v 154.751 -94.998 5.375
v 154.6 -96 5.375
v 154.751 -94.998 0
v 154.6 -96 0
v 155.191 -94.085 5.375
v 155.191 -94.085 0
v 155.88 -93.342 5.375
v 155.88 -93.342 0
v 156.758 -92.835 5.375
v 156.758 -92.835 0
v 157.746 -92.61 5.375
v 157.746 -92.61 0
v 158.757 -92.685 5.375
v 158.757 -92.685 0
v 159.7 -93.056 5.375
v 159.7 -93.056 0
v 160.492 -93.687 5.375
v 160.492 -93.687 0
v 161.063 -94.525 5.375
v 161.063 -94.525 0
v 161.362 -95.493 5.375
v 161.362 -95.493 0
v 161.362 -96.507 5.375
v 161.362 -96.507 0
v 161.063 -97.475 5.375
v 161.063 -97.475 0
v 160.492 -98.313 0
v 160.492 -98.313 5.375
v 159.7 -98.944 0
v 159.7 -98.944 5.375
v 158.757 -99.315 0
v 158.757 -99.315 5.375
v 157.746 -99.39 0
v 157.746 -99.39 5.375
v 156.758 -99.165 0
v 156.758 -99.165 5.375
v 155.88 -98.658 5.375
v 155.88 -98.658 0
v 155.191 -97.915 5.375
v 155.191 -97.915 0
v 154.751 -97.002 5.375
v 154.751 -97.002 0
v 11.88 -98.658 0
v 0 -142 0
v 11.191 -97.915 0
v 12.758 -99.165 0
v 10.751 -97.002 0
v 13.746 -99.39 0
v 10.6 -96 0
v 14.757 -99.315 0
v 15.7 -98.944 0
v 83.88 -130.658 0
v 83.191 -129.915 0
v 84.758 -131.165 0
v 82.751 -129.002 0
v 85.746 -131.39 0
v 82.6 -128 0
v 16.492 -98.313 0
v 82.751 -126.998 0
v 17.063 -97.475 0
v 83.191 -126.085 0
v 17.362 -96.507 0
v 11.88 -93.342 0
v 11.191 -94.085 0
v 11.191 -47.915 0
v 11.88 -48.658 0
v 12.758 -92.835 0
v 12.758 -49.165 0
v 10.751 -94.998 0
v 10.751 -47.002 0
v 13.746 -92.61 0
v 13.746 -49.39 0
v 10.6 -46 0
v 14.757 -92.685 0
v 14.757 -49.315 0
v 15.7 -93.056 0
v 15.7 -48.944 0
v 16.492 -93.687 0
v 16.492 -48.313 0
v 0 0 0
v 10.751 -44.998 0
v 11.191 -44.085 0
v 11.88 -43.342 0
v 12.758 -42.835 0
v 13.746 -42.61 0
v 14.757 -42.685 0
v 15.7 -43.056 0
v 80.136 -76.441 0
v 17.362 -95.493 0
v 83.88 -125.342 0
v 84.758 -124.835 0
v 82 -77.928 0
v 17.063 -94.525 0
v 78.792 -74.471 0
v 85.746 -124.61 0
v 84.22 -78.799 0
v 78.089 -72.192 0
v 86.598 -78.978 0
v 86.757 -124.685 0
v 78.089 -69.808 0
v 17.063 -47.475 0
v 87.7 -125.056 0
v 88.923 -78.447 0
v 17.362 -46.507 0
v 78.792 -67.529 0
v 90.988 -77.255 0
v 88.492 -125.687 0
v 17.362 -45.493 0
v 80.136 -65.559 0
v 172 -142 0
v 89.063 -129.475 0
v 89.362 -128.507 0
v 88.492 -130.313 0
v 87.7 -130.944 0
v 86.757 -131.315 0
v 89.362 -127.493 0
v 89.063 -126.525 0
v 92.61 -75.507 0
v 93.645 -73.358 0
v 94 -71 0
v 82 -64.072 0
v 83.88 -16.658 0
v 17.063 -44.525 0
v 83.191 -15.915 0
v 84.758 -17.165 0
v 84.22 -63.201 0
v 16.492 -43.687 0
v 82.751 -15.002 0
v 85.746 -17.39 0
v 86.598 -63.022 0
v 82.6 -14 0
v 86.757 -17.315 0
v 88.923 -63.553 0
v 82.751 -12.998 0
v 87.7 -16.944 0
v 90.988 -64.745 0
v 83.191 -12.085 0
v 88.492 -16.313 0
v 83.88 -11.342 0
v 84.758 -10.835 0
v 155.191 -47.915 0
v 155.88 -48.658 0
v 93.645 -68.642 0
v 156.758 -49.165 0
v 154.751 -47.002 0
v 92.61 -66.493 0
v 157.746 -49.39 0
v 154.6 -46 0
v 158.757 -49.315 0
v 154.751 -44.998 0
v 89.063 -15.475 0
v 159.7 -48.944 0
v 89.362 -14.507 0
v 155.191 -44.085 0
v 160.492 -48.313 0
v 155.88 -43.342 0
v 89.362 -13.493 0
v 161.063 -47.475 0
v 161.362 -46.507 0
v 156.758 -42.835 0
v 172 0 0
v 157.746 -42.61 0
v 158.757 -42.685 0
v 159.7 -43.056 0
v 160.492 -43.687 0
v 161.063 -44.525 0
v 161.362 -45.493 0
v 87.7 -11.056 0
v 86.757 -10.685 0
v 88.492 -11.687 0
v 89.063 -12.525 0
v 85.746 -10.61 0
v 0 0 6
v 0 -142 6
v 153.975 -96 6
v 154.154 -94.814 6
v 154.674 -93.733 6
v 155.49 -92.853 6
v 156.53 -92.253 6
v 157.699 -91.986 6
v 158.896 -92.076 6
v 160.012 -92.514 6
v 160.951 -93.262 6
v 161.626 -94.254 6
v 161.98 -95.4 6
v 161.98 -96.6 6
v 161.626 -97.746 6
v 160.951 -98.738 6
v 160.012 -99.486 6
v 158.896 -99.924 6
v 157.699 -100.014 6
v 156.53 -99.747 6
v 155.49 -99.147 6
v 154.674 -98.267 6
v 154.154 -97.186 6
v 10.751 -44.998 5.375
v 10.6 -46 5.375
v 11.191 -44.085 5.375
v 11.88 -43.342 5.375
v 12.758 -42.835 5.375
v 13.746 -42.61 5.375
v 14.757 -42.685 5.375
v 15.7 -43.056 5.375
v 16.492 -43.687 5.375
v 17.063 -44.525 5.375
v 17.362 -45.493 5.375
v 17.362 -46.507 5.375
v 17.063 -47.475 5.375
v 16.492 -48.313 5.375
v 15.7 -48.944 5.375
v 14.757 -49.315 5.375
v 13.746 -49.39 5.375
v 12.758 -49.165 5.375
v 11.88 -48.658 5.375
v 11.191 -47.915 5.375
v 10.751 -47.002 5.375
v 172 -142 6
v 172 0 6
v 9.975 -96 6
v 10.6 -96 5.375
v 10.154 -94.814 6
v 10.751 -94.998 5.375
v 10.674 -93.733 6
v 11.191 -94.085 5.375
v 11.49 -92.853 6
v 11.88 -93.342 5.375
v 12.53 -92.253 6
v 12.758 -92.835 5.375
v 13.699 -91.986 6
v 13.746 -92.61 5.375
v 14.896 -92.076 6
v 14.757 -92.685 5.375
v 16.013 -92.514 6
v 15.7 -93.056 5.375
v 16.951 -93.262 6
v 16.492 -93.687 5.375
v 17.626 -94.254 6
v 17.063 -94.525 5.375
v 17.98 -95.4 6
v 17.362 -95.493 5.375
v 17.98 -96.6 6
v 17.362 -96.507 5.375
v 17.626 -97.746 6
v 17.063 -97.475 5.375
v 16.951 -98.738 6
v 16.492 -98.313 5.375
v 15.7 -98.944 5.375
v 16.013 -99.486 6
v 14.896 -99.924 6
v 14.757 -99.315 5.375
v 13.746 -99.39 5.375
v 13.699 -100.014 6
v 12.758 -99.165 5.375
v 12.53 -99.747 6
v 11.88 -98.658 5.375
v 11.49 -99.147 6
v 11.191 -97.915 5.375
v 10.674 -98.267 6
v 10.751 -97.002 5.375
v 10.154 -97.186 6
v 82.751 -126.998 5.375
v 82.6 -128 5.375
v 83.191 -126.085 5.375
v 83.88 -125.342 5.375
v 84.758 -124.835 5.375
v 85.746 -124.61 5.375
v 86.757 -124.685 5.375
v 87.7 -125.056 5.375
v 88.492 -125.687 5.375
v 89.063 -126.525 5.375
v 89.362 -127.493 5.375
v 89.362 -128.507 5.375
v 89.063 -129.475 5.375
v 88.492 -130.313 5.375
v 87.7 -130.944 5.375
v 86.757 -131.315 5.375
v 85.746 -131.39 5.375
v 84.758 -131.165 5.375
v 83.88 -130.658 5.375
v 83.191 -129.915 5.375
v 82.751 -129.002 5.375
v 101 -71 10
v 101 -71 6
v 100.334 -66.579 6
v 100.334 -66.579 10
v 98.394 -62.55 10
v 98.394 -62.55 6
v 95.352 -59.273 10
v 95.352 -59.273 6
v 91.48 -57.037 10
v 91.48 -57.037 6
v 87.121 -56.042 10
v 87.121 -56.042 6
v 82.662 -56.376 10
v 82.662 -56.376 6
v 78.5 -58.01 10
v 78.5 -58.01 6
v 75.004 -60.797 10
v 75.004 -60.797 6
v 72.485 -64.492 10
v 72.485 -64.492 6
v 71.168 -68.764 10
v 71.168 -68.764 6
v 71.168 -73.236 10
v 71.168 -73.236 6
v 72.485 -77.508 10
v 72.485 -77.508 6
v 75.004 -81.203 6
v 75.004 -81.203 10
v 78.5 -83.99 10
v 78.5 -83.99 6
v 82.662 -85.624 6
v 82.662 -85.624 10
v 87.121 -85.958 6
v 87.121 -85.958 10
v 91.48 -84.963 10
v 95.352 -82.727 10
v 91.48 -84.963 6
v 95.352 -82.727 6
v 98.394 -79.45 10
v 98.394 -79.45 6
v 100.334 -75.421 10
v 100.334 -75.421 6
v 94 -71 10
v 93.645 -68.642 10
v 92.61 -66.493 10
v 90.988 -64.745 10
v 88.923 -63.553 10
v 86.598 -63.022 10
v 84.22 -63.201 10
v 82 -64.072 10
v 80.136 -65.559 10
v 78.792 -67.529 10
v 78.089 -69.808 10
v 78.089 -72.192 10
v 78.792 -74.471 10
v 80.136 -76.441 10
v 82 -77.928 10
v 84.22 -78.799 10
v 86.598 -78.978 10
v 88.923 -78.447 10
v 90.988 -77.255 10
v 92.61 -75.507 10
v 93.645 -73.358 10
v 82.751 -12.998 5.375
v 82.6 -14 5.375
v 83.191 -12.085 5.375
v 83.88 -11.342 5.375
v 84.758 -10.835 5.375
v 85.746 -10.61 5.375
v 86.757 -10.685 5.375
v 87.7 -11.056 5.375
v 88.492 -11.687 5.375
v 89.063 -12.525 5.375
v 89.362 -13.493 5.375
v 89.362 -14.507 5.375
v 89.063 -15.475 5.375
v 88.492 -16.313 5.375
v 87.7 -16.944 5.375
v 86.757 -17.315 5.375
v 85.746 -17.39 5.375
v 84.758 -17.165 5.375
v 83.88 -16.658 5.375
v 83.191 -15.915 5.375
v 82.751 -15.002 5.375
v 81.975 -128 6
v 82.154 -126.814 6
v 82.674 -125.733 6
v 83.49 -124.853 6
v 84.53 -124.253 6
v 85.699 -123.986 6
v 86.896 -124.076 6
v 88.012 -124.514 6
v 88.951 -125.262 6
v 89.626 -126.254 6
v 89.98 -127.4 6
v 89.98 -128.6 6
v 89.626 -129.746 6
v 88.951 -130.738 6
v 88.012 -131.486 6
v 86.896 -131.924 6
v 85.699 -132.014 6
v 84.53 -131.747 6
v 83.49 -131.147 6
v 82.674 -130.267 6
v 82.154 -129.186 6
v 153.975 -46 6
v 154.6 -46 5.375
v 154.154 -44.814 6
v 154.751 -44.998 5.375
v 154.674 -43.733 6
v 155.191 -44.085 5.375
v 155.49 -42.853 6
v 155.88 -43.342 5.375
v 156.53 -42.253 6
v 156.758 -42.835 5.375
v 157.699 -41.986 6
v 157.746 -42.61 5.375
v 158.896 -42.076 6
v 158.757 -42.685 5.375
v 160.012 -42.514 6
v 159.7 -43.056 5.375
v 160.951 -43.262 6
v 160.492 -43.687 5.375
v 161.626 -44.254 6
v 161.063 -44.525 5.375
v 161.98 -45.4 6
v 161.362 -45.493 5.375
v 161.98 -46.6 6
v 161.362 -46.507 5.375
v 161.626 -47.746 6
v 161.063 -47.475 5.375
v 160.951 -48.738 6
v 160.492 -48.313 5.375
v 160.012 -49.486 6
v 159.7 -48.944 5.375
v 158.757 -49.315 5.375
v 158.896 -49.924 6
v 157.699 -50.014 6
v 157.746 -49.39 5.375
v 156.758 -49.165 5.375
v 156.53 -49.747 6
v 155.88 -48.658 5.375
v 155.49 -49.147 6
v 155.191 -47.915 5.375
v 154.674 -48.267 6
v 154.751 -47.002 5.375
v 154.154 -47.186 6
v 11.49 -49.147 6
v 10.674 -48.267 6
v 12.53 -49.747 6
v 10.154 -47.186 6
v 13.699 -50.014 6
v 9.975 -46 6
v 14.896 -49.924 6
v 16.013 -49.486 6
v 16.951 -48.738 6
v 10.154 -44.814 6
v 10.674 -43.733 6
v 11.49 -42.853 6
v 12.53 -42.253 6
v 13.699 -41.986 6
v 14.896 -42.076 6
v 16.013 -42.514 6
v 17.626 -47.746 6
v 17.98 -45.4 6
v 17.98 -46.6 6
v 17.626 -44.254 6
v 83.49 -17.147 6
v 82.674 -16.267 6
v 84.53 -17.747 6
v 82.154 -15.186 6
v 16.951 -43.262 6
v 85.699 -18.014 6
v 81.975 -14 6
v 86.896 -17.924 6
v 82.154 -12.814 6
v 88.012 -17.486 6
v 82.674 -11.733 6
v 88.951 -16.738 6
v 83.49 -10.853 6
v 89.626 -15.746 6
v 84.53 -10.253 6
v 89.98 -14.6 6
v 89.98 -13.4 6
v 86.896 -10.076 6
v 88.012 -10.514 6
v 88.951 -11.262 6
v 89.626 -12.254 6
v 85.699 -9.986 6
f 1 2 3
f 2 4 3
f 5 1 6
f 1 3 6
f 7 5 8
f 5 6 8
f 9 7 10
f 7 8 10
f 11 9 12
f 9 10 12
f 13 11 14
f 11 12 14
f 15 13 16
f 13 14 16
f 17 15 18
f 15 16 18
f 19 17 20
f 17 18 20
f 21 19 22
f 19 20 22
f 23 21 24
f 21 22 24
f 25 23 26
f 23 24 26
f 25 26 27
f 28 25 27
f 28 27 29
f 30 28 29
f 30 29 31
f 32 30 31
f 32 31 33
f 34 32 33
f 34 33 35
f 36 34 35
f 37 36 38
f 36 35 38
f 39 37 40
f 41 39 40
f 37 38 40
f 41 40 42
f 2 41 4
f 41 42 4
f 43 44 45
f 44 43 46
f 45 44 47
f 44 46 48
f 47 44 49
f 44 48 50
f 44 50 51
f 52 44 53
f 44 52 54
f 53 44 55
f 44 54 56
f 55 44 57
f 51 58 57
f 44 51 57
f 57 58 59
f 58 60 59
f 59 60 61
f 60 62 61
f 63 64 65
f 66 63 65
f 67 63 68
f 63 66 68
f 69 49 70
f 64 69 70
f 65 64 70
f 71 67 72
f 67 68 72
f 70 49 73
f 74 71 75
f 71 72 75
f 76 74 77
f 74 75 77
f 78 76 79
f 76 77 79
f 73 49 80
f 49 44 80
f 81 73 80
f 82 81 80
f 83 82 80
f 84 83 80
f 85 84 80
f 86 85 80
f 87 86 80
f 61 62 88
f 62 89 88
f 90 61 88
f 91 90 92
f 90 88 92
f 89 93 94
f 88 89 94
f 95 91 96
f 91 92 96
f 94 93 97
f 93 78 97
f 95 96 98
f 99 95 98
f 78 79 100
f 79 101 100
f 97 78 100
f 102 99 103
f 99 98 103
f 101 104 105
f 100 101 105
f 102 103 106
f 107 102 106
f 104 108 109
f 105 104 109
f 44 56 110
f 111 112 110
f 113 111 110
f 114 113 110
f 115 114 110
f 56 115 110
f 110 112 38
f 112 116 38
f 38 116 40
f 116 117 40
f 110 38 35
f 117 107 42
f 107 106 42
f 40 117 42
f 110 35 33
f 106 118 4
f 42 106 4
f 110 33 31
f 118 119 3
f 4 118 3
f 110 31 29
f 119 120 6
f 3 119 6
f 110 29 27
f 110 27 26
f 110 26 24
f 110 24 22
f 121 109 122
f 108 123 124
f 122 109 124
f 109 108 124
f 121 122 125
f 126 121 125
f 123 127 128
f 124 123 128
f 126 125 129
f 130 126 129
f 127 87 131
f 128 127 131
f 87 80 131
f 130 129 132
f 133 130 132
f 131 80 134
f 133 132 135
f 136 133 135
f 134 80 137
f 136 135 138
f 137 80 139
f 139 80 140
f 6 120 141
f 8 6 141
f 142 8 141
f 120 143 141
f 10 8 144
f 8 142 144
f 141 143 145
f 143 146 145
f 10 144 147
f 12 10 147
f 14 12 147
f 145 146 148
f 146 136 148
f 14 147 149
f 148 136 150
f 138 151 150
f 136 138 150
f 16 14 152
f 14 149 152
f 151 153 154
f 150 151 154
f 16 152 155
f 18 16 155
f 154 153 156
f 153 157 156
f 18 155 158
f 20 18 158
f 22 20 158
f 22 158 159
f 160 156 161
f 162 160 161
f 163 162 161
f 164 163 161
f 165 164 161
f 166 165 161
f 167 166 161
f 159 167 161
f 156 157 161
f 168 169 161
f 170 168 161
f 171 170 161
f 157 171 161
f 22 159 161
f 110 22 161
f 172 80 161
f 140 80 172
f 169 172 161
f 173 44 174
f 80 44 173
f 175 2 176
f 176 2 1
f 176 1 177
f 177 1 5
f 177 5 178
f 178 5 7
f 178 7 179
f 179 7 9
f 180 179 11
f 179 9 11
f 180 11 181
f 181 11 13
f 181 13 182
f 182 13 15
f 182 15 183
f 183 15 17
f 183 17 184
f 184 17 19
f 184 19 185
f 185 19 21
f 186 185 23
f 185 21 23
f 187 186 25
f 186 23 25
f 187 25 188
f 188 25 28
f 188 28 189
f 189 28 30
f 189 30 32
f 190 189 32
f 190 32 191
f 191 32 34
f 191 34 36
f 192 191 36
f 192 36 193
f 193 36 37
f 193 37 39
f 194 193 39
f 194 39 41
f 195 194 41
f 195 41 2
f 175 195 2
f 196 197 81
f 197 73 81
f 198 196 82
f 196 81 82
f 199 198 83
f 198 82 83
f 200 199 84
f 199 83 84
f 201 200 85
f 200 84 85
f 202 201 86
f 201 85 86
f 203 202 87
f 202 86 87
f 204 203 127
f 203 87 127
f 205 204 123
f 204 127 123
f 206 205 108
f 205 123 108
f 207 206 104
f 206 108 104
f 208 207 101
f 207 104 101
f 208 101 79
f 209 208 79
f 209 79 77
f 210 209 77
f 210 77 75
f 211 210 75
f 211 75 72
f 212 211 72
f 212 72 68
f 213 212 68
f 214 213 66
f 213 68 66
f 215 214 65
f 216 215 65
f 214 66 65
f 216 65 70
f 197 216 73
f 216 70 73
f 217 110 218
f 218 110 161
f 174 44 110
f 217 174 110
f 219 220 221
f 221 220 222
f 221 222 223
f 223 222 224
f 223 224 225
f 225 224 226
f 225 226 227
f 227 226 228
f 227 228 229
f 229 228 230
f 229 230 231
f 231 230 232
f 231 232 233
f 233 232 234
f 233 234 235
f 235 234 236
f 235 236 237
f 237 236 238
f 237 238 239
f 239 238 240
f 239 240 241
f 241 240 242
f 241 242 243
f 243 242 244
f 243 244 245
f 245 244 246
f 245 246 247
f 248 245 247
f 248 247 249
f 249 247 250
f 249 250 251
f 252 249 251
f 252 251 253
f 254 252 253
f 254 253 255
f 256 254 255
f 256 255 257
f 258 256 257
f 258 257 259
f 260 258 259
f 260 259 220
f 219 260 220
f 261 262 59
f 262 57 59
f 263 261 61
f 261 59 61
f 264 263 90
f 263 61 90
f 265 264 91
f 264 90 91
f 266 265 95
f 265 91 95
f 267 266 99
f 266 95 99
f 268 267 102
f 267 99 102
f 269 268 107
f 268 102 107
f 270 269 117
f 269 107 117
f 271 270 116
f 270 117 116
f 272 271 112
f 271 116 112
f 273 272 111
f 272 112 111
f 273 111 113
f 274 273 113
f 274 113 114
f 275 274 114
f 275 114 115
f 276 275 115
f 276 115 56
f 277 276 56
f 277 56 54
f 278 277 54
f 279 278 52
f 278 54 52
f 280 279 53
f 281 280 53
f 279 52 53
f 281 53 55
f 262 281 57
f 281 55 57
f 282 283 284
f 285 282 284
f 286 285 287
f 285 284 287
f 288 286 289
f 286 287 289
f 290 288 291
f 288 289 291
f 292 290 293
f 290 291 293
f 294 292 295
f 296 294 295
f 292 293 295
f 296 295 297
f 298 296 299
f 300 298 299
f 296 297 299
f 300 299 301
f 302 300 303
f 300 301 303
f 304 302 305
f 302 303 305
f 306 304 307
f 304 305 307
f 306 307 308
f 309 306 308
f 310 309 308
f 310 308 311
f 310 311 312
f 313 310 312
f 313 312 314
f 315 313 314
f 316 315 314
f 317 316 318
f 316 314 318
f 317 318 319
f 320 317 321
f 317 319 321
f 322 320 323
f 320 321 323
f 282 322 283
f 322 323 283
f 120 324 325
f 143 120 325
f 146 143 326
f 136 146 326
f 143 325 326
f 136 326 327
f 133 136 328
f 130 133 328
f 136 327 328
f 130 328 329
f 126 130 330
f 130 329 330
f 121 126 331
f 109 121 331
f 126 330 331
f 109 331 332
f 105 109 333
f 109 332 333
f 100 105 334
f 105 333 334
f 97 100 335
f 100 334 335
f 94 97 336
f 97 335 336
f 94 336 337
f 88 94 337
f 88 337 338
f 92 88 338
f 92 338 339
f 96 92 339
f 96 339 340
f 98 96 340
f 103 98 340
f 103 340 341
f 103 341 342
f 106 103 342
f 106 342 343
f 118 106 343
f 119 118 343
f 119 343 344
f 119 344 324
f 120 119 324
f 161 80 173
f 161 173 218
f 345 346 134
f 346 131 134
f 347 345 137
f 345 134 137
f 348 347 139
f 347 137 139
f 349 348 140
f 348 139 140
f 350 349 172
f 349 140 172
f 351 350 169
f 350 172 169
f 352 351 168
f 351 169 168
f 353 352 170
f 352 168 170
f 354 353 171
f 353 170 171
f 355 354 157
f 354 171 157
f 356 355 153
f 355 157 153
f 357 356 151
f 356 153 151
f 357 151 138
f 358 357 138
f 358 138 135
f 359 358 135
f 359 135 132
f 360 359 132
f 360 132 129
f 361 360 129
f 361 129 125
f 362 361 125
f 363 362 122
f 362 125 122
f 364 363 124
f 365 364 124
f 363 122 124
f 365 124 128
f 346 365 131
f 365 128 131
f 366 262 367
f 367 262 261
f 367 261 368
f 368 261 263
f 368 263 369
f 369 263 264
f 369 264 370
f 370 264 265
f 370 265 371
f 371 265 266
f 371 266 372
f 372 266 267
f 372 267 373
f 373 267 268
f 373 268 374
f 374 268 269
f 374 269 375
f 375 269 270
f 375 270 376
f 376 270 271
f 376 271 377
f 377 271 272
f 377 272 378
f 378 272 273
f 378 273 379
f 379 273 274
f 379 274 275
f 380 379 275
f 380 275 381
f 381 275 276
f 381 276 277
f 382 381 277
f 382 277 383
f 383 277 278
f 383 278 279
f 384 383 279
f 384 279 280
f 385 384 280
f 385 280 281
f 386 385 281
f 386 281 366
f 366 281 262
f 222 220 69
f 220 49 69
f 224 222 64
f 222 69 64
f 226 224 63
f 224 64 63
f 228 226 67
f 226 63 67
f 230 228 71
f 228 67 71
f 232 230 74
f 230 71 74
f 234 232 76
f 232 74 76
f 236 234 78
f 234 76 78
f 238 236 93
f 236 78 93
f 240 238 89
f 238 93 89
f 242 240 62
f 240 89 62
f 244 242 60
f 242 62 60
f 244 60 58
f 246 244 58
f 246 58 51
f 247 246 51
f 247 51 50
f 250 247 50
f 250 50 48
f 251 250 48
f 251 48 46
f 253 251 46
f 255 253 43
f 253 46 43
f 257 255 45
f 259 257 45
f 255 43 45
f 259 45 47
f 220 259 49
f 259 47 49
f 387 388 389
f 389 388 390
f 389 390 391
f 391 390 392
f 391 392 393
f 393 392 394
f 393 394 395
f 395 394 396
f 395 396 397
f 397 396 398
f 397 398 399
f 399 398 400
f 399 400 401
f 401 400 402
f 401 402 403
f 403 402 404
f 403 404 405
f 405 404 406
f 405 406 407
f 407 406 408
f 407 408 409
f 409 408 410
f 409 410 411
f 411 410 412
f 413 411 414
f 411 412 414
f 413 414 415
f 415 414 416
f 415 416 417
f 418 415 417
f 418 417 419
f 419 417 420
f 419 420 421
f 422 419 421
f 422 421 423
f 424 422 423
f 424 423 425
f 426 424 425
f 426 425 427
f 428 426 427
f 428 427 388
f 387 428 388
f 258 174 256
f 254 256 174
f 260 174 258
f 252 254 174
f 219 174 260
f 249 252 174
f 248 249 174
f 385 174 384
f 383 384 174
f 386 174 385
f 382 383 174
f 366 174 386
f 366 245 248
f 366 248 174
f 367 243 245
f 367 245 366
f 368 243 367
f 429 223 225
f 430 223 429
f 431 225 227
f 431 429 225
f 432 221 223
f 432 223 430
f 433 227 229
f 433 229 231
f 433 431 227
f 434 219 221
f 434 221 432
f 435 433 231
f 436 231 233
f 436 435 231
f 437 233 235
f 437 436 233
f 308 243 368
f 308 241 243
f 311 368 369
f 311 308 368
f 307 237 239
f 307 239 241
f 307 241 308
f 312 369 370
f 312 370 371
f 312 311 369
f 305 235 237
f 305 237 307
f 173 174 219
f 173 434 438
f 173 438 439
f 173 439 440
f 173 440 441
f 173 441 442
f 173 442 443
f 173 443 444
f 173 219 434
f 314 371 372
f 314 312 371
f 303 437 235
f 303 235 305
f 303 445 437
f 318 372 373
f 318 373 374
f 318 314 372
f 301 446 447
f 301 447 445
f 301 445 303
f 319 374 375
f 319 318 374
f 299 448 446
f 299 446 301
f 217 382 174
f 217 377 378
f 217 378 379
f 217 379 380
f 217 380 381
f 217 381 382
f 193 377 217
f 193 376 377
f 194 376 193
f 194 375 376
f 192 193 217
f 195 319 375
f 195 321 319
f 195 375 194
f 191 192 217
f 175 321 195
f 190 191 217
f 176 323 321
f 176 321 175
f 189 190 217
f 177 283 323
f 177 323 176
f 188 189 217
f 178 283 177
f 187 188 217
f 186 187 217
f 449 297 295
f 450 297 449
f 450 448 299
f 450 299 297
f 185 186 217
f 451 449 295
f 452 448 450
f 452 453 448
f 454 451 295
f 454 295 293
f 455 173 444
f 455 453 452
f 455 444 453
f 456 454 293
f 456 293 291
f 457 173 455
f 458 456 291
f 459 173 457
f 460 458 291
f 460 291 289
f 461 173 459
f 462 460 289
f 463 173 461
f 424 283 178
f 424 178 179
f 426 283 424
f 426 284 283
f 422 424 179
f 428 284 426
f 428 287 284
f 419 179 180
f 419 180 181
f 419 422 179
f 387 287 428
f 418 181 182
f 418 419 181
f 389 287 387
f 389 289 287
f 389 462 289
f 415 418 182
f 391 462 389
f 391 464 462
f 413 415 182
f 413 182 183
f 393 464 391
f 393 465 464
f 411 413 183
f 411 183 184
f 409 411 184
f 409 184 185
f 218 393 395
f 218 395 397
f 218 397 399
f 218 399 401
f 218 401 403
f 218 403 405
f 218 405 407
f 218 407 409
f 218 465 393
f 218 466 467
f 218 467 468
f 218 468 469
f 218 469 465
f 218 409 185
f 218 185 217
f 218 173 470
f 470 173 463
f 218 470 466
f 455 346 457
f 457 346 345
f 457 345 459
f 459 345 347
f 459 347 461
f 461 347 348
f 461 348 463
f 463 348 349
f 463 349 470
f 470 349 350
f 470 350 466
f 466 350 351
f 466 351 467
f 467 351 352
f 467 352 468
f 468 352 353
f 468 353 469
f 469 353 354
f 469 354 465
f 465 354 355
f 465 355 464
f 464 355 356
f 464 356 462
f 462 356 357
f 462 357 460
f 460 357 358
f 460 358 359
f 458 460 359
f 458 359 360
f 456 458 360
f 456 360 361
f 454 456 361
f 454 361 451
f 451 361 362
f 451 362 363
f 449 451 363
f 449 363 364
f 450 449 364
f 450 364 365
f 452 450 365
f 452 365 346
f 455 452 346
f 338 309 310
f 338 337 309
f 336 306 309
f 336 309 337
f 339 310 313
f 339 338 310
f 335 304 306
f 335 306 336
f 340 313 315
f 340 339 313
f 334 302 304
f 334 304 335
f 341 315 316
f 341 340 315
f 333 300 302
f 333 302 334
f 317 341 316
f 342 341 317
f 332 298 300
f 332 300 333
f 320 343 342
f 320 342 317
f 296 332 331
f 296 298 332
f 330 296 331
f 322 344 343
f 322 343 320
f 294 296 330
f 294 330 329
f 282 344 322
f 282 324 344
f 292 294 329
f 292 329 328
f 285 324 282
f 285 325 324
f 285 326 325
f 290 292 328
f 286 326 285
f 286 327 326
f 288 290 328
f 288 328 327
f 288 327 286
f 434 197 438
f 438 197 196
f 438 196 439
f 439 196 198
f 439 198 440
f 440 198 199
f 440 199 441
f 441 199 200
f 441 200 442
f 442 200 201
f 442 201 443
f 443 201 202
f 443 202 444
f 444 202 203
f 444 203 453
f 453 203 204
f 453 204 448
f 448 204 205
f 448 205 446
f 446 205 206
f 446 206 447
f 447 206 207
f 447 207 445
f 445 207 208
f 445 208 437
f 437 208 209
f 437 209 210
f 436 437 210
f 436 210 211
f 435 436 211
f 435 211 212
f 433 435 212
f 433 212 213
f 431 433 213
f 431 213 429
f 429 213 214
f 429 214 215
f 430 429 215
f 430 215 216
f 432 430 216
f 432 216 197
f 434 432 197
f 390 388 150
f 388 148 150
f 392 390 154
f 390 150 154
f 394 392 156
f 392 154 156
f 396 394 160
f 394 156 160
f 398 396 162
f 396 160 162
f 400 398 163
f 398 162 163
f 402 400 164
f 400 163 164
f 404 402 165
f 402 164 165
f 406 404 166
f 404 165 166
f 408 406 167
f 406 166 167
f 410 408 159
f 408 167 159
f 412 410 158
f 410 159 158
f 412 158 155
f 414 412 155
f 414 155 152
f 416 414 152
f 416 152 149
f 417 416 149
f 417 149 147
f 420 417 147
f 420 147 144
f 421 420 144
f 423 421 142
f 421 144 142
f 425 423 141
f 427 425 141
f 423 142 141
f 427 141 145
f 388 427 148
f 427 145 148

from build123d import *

# Parameters (mm, degrees)
SKETCH_1_W                   = 172
SKETCH_1_H                   = 142
EXTRUDE_1_DEPTH              = 6
HOLE_WIZARD_M8_1_D           = 6.8
HOLE_WIZARD_M8_1_DEPTH       = 6
HOLE_WIZARD_M8_1_CSINK_D     = 8.05
HOLE_WIZARD_M8_1_CSINK_ANGLE = 90
HOLE_WIZARD_M8_1_TIP         = 2.042926105
SKETCH_11_R                  = 15
EXTRUDE_3_DEPTH              = 4
SKETCH_12_R                  = 8
CUT_EXTRUDE_1_DEPTH          = 224.266656713


with BuildPart() as part:
    # 草图1 → 凸台-拉伸1 (new body)
    with BuildSketch(Plane.XY):
        with Locations((86, -71)):
            Rectangle(SKETCH_1_W, SKETCH_1_H)
    extrude(amount=EXTRUDE_1_DEPTH)

    # M8 螺纹孔1
    with Locations(Plane.XY.offset(6)):
        with Locations((14, -46), (14, -96), (86, -14), (86, -128), (158, -96), (158, -46)):
            CounterSinkHole(HOLE_WIZARD_M8_1_D / 2, HOLE_WIZARD_M8_1_CSINK_D / 2, depth=HOLE_WIZARD_M8_1_DEPTH, counter_sink_angle=HOLE_WIZARD_M8_1_CSINK_ANGLE)
            with Locations((0, 0, -(HOLE_WIZARD_M8_1_DEPTH + HOLE_WIZARD_M8_1_TIP / 2))):  # 118° drill point
                Cone(0, HOLE_WIZARD_M8_1_D / 2, HOLE_WIZARD_M8_1_TIP, mode=Mode.SUBTRACT)

    # 草图11 → 凸台-拉伸3 (add)
    with BuildSketch(Plane.XY.offset(6)):
        with Locations((86, -71)):
            Circle(SKETCH_11_R)
    extrude(amount=EXTRUDE_3_DEPTH)

    # 草图12 → 切除-拉伸1 (cut, through all)
    with BuildSketch(Plane.XY.offset(10)):
        with Locations((86, -71)):
            Circle(SKETCH_12_R)
    extrude(amount=-CUT_EXTRUDE_1_DEPTH, mode=Mode.SUBTRACT)


solid = part.part
